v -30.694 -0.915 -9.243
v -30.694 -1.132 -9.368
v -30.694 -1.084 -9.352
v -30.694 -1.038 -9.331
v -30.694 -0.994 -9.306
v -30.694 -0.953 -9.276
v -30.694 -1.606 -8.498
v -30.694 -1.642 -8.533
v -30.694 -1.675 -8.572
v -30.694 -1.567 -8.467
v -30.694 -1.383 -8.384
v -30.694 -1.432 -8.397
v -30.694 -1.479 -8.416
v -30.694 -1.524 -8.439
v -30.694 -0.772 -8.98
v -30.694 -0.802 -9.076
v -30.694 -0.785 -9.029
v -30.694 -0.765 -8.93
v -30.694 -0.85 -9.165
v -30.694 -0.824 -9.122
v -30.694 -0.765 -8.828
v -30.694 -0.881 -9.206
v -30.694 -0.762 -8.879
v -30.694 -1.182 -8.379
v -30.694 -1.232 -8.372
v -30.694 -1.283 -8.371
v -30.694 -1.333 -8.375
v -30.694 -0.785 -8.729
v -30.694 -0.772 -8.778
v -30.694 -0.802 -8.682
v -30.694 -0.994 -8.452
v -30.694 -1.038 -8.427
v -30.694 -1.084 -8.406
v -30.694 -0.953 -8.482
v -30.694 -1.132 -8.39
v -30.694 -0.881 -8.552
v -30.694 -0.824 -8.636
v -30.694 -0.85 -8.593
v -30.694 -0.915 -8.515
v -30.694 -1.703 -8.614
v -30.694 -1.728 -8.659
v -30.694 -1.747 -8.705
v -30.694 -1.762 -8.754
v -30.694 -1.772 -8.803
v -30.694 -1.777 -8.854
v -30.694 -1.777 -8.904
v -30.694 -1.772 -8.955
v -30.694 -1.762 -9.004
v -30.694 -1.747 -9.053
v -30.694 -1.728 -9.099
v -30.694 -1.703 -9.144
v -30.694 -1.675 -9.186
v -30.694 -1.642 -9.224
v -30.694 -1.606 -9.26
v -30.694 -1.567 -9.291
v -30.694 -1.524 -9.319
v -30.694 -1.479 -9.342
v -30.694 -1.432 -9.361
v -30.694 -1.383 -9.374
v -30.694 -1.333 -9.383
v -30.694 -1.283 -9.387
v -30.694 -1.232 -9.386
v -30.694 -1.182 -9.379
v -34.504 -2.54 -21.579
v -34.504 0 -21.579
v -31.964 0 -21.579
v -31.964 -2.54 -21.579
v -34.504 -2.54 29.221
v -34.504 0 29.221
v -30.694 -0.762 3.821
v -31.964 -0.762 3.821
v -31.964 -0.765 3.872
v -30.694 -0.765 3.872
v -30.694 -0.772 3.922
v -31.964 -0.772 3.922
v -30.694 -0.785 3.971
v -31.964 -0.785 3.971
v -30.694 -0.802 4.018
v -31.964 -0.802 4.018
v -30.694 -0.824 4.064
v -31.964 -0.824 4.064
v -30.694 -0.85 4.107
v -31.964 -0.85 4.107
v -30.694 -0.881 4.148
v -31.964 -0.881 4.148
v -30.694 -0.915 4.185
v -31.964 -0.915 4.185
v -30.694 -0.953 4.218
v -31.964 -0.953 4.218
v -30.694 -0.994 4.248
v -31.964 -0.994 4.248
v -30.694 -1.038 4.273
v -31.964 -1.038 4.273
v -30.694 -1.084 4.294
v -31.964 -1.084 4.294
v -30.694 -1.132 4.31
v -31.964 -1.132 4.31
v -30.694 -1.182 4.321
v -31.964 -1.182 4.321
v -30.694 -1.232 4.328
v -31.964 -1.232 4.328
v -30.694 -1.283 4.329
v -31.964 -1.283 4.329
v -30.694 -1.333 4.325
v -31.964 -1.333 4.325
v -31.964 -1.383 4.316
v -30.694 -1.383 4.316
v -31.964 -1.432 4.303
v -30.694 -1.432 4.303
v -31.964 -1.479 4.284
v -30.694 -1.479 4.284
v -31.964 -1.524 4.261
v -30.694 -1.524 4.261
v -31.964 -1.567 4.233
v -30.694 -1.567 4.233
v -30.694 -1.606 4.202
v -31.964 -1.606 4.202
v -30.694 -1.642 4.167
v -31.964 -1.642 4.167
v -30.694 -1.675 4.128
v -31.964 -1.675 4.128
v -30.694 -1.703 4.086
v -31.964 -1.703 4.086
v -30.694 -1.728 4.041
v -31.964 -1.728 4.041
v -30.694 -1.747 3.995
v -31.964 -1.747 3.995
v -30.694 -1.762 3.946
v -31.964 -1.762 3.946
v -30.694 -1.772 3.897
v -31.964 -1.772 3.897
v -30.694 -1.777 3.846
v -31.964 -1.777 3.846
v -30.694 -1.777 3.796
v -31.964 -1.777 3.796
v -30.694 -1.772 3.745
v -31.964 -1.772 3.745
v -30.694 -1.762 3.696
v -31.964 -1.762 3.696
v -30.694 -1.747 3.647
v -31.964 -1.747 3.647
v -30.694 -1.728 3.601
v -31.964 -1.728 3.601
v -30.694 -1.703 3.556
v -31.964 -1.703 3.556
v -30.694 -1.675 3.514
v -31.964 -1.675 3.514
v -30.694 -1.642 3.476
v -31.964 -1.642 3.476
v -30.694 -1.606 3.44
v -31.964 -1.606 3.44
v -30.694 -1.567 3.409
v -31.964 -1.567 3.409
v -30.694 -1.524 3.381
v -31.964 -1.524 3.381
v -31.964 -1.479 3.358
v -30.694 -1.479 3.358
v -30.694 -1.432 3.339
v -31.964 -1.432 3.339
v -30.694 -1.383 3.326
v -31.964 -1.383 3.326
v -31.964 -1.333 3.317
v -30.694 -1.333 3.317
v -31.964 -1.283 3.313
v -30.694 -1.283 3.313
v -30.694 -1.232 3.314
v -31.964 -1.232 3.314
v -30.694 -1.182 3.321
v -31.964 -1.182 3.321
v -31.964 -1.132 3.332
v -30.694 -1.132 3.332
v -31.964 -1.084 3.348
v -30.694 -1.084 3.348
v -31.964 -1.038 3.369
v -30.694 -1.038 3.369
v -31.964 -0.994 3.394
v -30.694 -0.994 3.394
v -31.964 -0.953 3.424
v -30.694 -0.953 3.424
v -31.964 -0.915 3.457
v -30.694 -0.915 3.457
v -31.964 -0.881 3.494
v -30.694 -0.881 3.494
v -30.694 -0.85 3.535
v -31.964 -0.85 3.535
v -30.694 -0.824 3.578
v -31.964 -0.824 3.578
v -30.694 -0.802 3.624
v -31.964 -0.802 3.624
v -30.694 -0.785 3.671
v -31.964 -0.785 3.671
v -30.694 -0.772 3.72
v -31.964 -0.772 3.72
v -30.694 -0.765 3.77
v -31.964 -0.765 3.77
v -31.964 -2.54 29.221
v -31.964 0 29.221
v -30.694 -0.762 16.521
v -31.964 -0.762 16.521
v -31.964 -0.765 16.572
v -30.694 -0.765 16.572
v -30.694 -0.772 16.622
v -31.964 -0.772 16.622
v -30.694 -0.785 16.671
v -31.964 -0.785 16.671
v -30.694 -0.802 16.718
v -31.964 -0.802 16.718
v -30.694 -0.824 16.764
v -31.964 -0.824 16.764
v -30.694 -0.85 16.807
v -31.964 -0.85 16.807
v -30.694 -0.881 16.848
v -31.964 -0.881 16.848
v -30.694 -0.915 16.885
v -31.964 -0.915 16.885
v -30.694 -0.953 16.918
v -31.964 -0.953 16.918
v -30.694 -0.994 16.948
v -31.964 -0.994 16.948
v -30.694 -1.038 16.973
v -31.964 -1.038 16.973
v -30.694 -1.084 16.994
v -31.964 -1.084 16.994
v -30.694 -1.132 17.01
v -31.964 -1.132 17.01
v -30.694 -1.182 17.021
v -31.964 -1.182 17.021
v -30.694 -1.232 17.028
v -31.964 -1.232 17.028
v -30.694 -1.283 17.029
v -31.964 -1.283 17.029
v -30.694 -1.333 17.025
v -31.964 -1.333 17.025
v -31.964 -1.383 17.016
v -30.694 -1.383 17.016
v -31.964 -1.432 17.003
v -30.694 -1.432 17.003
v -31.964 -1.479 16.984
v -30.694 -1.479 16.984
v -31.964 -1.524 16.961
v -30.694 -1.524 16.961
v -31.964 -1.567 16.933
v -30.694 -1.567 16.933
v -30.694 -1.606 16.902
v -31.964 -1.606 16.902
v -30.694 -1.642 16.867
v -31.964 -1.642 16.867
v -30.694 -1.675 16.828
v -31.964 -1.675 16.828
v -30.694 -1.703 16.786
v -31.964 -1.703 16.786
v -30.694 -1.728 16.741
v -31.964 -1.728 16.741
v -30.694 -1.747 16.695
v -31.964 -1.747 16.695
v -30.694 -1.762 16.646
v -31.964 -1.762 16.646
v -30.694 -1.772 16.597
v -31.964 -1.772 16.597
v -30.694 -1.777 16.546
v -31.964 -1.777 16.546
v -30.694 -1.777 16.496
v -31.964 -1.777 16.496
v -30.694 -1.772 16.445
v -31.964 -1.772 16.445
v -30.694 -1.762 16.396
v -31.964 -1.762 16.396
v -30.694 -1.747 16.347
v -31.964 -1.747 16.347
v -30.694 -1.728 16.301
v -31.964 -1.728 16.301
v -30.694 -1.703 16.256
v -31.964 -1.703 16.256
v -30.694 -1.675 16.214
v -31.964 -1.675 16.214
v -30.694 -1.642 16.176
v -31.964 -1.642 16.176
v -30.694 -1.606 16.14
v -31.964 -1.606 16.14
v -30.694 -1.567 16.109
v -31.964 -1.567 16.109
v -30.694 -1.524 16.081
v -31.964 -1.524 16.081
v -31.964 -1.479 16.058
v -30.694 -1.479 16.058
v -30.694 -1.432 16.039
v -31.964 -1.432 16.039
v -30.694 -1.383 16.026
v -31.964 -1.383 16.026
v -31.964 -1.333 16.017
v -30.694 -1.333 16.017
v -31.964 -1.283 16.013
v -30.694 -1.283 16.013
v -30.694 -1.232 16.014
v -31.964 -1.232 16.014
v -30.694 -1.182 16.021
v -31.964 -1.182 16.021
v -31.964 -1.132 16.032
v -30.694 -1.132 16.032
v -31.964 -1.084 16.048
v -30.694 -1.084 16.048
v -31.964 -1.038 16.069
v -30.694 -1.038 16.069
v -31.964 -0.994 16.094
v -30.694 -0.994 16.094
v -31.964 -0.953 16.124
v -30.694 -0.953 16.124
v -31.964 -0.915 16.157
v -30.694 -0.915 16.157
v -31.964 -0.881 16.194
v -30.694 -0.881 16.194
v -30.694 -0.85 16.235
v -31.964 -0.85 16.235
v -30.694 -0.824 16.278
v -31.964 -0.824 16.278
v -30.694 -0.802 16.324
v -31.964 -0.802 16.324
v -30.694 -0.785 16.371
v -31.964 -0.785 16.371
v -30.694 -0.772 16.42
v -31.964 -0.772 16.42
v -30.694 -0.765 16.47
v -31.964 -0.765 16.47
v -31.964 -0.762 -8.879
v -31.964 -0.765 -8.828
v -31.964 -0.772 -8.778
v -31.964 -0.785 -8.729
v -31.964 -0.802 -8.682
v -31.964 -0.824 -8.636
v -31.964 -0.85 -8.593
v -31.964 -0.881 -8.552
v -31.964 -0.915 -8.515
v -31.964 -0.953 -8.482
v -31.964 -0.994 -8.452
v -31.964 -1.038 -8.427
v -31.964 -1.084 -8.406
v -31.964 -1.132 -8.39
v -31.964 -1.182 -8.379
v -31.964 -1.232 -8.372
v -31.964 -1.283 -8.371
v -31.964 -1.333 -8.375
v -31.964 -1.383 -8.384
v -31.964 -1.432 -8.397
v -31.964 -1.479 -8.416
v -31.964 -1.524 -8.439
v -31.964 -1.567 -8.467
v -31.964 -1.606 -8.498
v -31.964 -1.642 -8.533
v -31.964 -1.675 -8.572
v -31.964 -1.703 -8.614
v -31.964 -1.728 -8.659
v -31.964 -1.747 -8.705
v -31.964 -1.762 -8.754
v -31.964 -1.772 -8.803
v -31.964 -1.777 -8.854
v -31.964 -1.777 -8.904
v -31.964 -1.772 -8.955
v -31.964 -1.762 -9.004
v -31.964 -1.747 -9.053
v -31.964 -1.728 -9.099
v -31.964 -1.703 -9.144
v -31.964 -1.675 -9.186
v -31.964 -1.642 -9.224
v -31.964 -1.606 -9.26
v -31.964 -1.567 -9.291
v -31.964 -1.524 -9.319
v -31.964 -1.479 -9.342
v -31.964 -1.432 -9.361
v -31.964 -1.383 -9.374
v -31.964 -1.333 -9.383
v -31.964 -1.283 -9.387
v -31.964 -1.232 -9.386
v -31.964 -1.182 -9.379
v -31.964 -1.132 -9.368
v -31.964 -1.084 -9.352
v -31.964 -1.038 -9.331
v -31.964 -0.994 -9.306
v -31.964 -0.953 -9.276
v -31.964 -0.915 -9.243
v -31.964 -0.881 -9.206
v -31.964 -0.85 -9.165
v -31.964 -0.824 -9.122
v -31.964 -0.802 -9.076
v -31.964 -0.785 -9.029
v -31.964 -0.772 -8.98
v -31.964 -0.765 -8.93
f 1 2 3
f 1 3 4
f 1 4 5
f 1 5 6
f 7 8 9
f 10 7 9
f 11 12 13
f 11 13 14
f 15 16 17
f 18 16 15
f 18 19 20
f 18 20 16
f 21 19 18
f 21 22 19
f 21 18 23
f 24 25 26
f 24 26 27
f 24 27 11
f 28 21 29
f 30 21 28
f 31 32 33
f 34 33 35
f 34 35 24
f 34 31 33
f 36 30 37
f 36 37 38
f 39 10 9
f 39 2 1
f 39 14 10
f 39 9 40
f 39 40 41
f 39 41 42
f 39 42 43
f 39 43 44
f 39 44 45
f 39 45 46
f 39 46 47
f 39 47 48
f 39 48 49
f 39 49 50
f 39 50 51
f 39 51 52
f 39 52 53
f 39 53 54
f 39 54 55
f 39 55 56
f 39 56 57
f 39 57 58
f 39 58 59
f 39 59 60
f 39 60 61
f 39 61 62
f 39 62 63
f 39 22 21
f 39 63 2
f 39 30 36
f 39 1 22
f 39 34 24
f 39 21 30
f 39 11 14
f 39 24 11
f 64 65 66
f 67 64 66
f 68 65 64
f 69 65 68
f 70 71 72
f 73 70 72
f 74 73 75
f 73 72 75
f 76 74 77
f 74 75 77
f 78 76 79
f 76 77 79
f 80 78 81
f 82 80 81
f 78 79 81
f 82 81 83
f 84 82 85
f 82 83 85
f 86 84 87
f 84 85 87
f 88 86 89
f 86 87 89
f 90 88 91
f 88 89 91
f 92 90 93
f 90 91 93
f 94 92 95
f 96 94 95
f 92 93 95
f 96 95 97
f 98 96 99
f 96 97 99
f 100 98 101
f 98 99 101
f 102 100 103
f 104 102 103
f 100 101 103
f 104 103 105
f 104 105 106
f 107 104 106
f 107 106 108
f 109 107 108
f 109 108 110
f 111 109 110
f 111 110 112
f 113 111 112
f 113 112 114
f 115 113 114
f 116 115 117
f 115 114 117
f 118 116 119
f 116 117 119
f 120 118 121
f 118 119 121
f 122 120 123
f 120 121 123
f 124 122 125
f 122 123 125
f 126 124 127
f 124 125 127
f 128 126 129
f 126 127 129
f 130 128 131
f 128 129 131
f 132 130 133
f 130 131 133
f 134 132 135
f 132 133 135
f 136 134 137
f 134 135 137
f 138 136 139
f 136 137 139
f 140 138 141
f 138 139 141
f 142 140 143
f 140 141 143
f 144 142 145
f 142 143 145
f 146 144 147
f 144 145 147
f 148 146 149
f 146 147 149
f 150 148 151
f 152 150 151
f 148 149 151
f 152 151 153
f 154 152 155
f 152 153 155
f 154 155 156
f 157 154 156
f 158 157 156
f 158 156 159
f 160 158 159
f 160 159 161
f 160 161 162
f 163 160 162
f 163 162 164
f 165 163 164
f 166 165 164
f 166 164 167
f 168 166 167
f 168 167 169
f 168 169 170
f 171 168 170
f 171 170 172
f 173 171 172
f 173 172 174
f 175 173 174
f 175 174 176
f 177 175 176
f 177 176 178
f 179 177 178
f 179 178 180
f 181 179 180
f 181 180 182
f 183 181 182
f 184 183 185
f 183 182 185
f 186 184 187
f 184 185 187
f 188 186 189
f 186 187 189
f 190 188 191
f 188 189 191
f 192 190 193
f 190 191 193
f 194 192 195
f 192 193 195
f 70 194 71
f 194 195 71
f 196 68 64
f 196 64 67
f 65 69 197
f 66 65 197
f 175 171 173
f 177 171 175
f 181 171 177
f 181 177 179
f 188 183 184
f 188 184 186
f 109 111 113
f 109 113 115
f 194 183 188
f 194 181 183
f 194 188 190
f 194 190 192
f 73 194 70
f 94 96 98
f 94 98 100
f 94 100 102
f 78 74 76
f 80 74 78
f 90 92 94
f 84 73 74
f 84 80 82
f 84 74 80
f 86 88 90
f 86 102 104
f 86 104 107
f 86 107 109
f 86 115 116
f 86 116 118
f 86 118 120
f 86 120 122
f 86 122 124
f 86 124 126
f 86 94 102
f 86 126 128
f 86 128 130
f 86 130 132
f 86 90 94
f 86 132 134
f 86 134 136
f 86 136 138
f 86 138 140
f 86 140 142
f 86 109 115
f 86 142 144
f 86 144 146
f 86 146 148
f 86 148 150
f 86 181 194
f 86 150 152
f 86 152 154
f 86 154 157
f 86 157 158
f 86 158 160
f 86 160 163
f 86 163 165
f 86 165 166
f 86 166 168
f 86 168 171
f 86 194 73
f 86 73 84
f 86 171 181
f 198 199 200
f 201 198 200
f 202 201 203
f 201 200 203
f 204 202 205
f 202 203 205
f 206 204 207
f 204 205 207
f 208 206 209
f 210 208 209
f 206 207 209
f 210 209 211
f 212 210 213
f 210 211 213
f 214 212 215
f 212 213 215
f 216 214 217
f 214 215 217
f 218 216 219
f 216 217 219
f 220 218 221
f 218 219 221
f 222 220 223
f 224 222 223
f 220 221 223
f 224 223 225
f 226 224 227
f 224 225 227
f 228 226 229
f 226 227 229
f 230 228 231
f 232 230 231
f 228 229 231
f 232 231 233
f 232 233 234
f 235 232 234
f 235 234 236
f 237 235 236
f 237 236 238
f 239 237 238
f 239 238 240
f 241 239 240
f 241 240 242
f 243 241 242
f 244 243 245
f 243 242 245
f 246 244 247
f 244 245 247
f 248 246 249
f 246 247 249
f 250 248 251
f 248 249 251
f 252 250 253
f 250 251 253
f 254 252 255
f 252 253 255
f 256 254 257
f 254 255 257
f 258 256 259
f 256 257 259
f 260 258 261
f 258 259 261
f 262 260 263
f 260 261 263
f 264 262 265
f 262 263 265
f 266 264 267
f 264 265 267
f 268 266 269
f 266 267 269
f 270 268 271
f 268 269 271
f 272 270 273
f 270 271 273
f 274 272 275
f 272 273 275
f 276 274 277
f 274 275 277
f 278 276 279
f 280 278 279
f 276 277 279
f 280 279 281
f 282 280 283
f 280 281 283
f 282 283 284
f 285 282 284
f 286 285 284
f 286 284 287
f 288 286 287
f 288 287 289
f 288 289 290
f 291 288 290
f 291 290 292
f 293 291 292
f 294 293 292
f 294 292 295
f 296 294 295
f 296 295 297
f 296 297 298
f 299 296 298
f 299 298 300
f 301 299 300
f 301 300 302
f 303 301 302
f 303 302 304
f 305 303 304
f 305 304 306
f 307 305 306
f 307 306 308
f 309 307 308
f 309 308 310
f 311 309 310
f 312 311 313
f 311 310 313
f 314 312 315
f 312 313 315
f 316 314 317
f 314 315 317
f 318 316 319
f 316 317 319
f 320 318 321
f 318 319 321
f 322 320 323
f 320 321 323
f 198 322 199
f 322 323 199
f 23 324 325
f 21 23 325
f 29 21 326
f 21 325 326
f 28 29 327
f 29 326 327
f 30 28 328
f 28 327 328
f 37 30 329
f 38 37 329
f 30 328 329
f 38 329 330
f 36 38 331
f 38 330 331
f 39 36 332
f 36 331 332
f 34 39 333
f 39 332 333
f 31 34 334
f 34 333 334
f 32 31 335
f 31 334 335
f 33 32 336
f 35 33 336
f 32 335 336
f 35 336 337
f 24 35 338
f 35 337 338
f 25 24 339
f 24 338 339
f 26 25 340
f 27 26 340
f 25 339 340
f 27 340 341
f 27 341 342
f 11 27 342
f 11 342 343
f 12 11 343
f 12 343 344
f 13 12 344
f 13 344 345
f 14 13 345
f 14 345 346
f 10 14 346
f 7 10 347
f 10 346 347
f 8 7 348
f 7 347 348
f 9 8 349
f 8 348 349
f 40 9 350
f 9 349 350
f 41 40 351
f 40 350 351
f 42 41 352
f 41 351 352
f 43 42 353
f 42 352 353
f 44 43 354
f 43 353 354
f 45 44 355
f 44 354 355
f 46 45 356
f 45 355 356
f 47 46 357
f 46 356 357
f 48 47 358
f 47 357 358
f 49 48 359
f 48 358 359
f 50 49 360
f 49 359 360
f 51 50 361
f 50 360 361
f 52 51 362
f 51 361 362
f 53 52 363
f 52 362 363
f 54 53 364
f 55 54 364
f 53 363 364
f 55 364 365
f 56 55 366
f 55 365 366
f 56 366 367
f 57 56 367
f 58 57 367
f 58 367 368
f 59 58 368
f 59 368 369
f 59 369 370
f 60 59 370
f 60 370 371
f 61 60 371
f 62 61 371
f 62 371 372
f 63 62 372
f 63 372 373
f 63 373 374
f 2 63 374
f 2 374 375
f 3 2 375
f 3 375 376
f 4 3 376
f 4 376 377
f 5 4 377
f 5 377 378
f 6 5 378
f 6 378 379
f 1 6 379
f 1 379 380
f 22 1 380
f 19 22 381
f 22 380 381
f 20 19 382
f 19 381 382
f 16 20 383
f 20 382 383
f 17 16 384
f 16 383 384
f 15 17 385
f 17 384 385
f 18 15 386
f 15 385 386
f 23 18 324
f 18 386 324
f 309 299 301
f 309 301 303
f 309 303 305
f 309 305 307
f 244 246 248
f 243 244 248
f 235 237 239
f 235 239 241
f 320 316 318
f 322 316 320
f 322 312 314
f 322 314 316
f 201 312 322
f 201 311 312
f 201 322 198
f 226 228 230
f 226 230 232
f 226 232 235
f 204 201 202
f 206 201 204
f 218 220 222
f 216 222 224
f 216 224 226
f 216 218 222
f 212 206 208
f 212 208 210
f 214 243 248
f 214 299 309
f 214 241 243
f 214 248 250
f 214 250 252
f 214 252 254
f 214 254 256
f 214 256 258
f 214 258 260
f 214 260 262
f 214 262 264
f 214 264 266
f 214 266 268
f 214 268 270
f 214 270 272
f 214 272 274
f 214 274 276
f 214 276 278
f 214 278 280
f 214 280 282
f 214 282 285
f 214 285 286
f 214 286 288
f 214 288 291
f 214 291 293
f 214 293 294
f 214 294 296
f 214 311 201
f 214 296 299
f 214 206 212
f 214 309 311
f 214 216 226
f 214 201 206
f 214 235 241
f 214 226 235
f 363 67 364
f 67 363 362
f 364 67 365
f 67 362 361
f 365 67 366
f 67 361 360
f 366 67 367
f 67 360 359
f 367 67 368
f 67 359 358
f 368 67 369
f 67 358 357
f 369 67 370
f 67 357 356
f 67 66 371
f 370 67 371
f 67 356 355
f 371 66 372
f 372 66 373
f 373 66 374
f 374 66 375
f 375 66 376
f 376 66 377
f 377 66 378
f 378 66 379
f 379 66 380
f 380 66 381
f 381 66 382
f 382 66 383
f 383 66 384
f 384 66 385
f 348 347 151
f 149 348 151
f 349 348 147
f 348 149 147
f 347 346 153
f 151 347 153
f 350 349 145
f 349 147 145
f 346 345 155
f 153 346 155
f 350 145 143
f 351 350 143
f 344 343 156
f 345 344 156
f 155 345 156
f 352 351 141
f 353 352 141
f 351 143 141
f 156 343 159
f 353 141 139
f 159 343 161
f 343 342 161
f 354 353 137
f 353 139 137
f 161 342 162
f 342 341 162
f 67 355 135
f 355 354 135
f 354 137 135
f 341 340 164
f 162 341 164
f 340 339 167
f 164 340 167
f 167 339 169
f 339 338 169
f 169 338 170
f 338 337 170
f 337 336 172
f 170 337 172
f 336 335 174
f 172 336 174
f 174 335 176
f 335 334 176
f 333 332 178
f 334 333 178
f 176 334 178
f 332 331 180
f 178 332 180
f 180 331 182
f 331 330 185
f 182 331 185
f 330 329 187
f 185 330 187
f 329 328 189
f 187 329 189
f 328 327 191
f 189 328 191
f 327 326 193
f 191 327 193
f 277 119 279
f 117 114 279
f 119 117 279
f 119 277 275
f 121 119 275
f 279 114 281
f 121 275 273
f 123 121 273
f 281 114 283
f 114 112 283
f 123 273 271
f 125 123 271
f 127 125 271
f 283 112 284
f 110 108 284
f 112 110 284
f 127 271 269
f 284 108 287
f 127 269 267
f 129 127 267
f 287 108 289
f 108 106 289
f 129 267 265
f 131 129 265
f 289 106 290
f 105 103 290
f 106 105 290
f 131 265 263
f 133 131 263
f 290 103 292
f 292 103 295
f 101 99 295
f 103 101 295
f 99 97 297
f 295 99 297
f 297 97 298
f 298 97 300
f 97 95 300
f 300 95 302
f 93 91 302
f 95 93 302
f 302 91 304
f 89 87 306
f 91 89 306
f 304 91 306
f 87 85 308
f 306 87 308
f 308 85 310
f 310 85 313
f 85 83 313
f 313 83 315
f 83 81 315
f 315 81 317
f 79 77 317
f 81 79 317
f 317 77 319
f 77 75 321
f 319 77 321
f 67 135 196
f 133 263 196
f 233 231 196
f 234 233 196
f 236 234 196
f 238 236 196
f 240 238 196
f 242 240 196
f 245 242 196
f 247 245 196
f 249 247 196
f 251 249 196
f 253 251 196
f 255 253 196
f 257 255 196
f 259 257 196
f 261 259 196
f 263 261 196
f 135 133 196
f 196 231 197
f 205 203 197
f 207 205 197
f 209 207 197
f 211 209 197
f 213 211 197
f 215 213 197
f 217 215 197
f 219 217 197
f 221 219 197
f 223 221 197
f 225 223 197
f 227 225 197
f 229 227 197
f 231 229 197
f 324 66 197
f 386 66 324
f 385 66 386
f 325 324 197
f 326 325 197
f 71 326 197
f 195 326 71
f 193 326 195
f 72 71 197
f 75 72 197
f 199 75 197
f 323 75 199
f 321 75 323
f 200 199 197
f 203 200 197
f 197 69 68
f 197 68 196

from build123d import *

# Parameters (mm, degrees)
F0_W     = 2.54
F0_H     = 50.8
F1_DEPTH = 2.54
F2_R     = 0.508
F3_DEPTH = 1.27
F4_DEPTH = 1.27


with BuildPart() as f1:
    # F0 (on Front) → F1 (new body)
    with BuildSketch(Plane.XZ):
        with Locations((-33.233647, 3.821034)):
            Rectangle(F0_W, F0_H)
    extrude(amount=F1_DEPTH)

    # F2 (on face) → F3 (join)
    with BuildSketch(Plane.YZ.offset(-31.963647)):
        with Locations((-1.27, 16.521034)):
            Circle(F2_R)
        with Locations((-1.27, 3.821034)):
            Circle(F2_R)
    extrude(amount=F3_DEPTH)

    # F2 (on face) → F4 (join)
    with BuildSketch(Plane.YZ.offset(-31.963647)):
        with Locations((-1.27, -8.878966)):
            Circle(F2_R)
    extrude(amount=F4_DEPTH)


solid = f1.part
